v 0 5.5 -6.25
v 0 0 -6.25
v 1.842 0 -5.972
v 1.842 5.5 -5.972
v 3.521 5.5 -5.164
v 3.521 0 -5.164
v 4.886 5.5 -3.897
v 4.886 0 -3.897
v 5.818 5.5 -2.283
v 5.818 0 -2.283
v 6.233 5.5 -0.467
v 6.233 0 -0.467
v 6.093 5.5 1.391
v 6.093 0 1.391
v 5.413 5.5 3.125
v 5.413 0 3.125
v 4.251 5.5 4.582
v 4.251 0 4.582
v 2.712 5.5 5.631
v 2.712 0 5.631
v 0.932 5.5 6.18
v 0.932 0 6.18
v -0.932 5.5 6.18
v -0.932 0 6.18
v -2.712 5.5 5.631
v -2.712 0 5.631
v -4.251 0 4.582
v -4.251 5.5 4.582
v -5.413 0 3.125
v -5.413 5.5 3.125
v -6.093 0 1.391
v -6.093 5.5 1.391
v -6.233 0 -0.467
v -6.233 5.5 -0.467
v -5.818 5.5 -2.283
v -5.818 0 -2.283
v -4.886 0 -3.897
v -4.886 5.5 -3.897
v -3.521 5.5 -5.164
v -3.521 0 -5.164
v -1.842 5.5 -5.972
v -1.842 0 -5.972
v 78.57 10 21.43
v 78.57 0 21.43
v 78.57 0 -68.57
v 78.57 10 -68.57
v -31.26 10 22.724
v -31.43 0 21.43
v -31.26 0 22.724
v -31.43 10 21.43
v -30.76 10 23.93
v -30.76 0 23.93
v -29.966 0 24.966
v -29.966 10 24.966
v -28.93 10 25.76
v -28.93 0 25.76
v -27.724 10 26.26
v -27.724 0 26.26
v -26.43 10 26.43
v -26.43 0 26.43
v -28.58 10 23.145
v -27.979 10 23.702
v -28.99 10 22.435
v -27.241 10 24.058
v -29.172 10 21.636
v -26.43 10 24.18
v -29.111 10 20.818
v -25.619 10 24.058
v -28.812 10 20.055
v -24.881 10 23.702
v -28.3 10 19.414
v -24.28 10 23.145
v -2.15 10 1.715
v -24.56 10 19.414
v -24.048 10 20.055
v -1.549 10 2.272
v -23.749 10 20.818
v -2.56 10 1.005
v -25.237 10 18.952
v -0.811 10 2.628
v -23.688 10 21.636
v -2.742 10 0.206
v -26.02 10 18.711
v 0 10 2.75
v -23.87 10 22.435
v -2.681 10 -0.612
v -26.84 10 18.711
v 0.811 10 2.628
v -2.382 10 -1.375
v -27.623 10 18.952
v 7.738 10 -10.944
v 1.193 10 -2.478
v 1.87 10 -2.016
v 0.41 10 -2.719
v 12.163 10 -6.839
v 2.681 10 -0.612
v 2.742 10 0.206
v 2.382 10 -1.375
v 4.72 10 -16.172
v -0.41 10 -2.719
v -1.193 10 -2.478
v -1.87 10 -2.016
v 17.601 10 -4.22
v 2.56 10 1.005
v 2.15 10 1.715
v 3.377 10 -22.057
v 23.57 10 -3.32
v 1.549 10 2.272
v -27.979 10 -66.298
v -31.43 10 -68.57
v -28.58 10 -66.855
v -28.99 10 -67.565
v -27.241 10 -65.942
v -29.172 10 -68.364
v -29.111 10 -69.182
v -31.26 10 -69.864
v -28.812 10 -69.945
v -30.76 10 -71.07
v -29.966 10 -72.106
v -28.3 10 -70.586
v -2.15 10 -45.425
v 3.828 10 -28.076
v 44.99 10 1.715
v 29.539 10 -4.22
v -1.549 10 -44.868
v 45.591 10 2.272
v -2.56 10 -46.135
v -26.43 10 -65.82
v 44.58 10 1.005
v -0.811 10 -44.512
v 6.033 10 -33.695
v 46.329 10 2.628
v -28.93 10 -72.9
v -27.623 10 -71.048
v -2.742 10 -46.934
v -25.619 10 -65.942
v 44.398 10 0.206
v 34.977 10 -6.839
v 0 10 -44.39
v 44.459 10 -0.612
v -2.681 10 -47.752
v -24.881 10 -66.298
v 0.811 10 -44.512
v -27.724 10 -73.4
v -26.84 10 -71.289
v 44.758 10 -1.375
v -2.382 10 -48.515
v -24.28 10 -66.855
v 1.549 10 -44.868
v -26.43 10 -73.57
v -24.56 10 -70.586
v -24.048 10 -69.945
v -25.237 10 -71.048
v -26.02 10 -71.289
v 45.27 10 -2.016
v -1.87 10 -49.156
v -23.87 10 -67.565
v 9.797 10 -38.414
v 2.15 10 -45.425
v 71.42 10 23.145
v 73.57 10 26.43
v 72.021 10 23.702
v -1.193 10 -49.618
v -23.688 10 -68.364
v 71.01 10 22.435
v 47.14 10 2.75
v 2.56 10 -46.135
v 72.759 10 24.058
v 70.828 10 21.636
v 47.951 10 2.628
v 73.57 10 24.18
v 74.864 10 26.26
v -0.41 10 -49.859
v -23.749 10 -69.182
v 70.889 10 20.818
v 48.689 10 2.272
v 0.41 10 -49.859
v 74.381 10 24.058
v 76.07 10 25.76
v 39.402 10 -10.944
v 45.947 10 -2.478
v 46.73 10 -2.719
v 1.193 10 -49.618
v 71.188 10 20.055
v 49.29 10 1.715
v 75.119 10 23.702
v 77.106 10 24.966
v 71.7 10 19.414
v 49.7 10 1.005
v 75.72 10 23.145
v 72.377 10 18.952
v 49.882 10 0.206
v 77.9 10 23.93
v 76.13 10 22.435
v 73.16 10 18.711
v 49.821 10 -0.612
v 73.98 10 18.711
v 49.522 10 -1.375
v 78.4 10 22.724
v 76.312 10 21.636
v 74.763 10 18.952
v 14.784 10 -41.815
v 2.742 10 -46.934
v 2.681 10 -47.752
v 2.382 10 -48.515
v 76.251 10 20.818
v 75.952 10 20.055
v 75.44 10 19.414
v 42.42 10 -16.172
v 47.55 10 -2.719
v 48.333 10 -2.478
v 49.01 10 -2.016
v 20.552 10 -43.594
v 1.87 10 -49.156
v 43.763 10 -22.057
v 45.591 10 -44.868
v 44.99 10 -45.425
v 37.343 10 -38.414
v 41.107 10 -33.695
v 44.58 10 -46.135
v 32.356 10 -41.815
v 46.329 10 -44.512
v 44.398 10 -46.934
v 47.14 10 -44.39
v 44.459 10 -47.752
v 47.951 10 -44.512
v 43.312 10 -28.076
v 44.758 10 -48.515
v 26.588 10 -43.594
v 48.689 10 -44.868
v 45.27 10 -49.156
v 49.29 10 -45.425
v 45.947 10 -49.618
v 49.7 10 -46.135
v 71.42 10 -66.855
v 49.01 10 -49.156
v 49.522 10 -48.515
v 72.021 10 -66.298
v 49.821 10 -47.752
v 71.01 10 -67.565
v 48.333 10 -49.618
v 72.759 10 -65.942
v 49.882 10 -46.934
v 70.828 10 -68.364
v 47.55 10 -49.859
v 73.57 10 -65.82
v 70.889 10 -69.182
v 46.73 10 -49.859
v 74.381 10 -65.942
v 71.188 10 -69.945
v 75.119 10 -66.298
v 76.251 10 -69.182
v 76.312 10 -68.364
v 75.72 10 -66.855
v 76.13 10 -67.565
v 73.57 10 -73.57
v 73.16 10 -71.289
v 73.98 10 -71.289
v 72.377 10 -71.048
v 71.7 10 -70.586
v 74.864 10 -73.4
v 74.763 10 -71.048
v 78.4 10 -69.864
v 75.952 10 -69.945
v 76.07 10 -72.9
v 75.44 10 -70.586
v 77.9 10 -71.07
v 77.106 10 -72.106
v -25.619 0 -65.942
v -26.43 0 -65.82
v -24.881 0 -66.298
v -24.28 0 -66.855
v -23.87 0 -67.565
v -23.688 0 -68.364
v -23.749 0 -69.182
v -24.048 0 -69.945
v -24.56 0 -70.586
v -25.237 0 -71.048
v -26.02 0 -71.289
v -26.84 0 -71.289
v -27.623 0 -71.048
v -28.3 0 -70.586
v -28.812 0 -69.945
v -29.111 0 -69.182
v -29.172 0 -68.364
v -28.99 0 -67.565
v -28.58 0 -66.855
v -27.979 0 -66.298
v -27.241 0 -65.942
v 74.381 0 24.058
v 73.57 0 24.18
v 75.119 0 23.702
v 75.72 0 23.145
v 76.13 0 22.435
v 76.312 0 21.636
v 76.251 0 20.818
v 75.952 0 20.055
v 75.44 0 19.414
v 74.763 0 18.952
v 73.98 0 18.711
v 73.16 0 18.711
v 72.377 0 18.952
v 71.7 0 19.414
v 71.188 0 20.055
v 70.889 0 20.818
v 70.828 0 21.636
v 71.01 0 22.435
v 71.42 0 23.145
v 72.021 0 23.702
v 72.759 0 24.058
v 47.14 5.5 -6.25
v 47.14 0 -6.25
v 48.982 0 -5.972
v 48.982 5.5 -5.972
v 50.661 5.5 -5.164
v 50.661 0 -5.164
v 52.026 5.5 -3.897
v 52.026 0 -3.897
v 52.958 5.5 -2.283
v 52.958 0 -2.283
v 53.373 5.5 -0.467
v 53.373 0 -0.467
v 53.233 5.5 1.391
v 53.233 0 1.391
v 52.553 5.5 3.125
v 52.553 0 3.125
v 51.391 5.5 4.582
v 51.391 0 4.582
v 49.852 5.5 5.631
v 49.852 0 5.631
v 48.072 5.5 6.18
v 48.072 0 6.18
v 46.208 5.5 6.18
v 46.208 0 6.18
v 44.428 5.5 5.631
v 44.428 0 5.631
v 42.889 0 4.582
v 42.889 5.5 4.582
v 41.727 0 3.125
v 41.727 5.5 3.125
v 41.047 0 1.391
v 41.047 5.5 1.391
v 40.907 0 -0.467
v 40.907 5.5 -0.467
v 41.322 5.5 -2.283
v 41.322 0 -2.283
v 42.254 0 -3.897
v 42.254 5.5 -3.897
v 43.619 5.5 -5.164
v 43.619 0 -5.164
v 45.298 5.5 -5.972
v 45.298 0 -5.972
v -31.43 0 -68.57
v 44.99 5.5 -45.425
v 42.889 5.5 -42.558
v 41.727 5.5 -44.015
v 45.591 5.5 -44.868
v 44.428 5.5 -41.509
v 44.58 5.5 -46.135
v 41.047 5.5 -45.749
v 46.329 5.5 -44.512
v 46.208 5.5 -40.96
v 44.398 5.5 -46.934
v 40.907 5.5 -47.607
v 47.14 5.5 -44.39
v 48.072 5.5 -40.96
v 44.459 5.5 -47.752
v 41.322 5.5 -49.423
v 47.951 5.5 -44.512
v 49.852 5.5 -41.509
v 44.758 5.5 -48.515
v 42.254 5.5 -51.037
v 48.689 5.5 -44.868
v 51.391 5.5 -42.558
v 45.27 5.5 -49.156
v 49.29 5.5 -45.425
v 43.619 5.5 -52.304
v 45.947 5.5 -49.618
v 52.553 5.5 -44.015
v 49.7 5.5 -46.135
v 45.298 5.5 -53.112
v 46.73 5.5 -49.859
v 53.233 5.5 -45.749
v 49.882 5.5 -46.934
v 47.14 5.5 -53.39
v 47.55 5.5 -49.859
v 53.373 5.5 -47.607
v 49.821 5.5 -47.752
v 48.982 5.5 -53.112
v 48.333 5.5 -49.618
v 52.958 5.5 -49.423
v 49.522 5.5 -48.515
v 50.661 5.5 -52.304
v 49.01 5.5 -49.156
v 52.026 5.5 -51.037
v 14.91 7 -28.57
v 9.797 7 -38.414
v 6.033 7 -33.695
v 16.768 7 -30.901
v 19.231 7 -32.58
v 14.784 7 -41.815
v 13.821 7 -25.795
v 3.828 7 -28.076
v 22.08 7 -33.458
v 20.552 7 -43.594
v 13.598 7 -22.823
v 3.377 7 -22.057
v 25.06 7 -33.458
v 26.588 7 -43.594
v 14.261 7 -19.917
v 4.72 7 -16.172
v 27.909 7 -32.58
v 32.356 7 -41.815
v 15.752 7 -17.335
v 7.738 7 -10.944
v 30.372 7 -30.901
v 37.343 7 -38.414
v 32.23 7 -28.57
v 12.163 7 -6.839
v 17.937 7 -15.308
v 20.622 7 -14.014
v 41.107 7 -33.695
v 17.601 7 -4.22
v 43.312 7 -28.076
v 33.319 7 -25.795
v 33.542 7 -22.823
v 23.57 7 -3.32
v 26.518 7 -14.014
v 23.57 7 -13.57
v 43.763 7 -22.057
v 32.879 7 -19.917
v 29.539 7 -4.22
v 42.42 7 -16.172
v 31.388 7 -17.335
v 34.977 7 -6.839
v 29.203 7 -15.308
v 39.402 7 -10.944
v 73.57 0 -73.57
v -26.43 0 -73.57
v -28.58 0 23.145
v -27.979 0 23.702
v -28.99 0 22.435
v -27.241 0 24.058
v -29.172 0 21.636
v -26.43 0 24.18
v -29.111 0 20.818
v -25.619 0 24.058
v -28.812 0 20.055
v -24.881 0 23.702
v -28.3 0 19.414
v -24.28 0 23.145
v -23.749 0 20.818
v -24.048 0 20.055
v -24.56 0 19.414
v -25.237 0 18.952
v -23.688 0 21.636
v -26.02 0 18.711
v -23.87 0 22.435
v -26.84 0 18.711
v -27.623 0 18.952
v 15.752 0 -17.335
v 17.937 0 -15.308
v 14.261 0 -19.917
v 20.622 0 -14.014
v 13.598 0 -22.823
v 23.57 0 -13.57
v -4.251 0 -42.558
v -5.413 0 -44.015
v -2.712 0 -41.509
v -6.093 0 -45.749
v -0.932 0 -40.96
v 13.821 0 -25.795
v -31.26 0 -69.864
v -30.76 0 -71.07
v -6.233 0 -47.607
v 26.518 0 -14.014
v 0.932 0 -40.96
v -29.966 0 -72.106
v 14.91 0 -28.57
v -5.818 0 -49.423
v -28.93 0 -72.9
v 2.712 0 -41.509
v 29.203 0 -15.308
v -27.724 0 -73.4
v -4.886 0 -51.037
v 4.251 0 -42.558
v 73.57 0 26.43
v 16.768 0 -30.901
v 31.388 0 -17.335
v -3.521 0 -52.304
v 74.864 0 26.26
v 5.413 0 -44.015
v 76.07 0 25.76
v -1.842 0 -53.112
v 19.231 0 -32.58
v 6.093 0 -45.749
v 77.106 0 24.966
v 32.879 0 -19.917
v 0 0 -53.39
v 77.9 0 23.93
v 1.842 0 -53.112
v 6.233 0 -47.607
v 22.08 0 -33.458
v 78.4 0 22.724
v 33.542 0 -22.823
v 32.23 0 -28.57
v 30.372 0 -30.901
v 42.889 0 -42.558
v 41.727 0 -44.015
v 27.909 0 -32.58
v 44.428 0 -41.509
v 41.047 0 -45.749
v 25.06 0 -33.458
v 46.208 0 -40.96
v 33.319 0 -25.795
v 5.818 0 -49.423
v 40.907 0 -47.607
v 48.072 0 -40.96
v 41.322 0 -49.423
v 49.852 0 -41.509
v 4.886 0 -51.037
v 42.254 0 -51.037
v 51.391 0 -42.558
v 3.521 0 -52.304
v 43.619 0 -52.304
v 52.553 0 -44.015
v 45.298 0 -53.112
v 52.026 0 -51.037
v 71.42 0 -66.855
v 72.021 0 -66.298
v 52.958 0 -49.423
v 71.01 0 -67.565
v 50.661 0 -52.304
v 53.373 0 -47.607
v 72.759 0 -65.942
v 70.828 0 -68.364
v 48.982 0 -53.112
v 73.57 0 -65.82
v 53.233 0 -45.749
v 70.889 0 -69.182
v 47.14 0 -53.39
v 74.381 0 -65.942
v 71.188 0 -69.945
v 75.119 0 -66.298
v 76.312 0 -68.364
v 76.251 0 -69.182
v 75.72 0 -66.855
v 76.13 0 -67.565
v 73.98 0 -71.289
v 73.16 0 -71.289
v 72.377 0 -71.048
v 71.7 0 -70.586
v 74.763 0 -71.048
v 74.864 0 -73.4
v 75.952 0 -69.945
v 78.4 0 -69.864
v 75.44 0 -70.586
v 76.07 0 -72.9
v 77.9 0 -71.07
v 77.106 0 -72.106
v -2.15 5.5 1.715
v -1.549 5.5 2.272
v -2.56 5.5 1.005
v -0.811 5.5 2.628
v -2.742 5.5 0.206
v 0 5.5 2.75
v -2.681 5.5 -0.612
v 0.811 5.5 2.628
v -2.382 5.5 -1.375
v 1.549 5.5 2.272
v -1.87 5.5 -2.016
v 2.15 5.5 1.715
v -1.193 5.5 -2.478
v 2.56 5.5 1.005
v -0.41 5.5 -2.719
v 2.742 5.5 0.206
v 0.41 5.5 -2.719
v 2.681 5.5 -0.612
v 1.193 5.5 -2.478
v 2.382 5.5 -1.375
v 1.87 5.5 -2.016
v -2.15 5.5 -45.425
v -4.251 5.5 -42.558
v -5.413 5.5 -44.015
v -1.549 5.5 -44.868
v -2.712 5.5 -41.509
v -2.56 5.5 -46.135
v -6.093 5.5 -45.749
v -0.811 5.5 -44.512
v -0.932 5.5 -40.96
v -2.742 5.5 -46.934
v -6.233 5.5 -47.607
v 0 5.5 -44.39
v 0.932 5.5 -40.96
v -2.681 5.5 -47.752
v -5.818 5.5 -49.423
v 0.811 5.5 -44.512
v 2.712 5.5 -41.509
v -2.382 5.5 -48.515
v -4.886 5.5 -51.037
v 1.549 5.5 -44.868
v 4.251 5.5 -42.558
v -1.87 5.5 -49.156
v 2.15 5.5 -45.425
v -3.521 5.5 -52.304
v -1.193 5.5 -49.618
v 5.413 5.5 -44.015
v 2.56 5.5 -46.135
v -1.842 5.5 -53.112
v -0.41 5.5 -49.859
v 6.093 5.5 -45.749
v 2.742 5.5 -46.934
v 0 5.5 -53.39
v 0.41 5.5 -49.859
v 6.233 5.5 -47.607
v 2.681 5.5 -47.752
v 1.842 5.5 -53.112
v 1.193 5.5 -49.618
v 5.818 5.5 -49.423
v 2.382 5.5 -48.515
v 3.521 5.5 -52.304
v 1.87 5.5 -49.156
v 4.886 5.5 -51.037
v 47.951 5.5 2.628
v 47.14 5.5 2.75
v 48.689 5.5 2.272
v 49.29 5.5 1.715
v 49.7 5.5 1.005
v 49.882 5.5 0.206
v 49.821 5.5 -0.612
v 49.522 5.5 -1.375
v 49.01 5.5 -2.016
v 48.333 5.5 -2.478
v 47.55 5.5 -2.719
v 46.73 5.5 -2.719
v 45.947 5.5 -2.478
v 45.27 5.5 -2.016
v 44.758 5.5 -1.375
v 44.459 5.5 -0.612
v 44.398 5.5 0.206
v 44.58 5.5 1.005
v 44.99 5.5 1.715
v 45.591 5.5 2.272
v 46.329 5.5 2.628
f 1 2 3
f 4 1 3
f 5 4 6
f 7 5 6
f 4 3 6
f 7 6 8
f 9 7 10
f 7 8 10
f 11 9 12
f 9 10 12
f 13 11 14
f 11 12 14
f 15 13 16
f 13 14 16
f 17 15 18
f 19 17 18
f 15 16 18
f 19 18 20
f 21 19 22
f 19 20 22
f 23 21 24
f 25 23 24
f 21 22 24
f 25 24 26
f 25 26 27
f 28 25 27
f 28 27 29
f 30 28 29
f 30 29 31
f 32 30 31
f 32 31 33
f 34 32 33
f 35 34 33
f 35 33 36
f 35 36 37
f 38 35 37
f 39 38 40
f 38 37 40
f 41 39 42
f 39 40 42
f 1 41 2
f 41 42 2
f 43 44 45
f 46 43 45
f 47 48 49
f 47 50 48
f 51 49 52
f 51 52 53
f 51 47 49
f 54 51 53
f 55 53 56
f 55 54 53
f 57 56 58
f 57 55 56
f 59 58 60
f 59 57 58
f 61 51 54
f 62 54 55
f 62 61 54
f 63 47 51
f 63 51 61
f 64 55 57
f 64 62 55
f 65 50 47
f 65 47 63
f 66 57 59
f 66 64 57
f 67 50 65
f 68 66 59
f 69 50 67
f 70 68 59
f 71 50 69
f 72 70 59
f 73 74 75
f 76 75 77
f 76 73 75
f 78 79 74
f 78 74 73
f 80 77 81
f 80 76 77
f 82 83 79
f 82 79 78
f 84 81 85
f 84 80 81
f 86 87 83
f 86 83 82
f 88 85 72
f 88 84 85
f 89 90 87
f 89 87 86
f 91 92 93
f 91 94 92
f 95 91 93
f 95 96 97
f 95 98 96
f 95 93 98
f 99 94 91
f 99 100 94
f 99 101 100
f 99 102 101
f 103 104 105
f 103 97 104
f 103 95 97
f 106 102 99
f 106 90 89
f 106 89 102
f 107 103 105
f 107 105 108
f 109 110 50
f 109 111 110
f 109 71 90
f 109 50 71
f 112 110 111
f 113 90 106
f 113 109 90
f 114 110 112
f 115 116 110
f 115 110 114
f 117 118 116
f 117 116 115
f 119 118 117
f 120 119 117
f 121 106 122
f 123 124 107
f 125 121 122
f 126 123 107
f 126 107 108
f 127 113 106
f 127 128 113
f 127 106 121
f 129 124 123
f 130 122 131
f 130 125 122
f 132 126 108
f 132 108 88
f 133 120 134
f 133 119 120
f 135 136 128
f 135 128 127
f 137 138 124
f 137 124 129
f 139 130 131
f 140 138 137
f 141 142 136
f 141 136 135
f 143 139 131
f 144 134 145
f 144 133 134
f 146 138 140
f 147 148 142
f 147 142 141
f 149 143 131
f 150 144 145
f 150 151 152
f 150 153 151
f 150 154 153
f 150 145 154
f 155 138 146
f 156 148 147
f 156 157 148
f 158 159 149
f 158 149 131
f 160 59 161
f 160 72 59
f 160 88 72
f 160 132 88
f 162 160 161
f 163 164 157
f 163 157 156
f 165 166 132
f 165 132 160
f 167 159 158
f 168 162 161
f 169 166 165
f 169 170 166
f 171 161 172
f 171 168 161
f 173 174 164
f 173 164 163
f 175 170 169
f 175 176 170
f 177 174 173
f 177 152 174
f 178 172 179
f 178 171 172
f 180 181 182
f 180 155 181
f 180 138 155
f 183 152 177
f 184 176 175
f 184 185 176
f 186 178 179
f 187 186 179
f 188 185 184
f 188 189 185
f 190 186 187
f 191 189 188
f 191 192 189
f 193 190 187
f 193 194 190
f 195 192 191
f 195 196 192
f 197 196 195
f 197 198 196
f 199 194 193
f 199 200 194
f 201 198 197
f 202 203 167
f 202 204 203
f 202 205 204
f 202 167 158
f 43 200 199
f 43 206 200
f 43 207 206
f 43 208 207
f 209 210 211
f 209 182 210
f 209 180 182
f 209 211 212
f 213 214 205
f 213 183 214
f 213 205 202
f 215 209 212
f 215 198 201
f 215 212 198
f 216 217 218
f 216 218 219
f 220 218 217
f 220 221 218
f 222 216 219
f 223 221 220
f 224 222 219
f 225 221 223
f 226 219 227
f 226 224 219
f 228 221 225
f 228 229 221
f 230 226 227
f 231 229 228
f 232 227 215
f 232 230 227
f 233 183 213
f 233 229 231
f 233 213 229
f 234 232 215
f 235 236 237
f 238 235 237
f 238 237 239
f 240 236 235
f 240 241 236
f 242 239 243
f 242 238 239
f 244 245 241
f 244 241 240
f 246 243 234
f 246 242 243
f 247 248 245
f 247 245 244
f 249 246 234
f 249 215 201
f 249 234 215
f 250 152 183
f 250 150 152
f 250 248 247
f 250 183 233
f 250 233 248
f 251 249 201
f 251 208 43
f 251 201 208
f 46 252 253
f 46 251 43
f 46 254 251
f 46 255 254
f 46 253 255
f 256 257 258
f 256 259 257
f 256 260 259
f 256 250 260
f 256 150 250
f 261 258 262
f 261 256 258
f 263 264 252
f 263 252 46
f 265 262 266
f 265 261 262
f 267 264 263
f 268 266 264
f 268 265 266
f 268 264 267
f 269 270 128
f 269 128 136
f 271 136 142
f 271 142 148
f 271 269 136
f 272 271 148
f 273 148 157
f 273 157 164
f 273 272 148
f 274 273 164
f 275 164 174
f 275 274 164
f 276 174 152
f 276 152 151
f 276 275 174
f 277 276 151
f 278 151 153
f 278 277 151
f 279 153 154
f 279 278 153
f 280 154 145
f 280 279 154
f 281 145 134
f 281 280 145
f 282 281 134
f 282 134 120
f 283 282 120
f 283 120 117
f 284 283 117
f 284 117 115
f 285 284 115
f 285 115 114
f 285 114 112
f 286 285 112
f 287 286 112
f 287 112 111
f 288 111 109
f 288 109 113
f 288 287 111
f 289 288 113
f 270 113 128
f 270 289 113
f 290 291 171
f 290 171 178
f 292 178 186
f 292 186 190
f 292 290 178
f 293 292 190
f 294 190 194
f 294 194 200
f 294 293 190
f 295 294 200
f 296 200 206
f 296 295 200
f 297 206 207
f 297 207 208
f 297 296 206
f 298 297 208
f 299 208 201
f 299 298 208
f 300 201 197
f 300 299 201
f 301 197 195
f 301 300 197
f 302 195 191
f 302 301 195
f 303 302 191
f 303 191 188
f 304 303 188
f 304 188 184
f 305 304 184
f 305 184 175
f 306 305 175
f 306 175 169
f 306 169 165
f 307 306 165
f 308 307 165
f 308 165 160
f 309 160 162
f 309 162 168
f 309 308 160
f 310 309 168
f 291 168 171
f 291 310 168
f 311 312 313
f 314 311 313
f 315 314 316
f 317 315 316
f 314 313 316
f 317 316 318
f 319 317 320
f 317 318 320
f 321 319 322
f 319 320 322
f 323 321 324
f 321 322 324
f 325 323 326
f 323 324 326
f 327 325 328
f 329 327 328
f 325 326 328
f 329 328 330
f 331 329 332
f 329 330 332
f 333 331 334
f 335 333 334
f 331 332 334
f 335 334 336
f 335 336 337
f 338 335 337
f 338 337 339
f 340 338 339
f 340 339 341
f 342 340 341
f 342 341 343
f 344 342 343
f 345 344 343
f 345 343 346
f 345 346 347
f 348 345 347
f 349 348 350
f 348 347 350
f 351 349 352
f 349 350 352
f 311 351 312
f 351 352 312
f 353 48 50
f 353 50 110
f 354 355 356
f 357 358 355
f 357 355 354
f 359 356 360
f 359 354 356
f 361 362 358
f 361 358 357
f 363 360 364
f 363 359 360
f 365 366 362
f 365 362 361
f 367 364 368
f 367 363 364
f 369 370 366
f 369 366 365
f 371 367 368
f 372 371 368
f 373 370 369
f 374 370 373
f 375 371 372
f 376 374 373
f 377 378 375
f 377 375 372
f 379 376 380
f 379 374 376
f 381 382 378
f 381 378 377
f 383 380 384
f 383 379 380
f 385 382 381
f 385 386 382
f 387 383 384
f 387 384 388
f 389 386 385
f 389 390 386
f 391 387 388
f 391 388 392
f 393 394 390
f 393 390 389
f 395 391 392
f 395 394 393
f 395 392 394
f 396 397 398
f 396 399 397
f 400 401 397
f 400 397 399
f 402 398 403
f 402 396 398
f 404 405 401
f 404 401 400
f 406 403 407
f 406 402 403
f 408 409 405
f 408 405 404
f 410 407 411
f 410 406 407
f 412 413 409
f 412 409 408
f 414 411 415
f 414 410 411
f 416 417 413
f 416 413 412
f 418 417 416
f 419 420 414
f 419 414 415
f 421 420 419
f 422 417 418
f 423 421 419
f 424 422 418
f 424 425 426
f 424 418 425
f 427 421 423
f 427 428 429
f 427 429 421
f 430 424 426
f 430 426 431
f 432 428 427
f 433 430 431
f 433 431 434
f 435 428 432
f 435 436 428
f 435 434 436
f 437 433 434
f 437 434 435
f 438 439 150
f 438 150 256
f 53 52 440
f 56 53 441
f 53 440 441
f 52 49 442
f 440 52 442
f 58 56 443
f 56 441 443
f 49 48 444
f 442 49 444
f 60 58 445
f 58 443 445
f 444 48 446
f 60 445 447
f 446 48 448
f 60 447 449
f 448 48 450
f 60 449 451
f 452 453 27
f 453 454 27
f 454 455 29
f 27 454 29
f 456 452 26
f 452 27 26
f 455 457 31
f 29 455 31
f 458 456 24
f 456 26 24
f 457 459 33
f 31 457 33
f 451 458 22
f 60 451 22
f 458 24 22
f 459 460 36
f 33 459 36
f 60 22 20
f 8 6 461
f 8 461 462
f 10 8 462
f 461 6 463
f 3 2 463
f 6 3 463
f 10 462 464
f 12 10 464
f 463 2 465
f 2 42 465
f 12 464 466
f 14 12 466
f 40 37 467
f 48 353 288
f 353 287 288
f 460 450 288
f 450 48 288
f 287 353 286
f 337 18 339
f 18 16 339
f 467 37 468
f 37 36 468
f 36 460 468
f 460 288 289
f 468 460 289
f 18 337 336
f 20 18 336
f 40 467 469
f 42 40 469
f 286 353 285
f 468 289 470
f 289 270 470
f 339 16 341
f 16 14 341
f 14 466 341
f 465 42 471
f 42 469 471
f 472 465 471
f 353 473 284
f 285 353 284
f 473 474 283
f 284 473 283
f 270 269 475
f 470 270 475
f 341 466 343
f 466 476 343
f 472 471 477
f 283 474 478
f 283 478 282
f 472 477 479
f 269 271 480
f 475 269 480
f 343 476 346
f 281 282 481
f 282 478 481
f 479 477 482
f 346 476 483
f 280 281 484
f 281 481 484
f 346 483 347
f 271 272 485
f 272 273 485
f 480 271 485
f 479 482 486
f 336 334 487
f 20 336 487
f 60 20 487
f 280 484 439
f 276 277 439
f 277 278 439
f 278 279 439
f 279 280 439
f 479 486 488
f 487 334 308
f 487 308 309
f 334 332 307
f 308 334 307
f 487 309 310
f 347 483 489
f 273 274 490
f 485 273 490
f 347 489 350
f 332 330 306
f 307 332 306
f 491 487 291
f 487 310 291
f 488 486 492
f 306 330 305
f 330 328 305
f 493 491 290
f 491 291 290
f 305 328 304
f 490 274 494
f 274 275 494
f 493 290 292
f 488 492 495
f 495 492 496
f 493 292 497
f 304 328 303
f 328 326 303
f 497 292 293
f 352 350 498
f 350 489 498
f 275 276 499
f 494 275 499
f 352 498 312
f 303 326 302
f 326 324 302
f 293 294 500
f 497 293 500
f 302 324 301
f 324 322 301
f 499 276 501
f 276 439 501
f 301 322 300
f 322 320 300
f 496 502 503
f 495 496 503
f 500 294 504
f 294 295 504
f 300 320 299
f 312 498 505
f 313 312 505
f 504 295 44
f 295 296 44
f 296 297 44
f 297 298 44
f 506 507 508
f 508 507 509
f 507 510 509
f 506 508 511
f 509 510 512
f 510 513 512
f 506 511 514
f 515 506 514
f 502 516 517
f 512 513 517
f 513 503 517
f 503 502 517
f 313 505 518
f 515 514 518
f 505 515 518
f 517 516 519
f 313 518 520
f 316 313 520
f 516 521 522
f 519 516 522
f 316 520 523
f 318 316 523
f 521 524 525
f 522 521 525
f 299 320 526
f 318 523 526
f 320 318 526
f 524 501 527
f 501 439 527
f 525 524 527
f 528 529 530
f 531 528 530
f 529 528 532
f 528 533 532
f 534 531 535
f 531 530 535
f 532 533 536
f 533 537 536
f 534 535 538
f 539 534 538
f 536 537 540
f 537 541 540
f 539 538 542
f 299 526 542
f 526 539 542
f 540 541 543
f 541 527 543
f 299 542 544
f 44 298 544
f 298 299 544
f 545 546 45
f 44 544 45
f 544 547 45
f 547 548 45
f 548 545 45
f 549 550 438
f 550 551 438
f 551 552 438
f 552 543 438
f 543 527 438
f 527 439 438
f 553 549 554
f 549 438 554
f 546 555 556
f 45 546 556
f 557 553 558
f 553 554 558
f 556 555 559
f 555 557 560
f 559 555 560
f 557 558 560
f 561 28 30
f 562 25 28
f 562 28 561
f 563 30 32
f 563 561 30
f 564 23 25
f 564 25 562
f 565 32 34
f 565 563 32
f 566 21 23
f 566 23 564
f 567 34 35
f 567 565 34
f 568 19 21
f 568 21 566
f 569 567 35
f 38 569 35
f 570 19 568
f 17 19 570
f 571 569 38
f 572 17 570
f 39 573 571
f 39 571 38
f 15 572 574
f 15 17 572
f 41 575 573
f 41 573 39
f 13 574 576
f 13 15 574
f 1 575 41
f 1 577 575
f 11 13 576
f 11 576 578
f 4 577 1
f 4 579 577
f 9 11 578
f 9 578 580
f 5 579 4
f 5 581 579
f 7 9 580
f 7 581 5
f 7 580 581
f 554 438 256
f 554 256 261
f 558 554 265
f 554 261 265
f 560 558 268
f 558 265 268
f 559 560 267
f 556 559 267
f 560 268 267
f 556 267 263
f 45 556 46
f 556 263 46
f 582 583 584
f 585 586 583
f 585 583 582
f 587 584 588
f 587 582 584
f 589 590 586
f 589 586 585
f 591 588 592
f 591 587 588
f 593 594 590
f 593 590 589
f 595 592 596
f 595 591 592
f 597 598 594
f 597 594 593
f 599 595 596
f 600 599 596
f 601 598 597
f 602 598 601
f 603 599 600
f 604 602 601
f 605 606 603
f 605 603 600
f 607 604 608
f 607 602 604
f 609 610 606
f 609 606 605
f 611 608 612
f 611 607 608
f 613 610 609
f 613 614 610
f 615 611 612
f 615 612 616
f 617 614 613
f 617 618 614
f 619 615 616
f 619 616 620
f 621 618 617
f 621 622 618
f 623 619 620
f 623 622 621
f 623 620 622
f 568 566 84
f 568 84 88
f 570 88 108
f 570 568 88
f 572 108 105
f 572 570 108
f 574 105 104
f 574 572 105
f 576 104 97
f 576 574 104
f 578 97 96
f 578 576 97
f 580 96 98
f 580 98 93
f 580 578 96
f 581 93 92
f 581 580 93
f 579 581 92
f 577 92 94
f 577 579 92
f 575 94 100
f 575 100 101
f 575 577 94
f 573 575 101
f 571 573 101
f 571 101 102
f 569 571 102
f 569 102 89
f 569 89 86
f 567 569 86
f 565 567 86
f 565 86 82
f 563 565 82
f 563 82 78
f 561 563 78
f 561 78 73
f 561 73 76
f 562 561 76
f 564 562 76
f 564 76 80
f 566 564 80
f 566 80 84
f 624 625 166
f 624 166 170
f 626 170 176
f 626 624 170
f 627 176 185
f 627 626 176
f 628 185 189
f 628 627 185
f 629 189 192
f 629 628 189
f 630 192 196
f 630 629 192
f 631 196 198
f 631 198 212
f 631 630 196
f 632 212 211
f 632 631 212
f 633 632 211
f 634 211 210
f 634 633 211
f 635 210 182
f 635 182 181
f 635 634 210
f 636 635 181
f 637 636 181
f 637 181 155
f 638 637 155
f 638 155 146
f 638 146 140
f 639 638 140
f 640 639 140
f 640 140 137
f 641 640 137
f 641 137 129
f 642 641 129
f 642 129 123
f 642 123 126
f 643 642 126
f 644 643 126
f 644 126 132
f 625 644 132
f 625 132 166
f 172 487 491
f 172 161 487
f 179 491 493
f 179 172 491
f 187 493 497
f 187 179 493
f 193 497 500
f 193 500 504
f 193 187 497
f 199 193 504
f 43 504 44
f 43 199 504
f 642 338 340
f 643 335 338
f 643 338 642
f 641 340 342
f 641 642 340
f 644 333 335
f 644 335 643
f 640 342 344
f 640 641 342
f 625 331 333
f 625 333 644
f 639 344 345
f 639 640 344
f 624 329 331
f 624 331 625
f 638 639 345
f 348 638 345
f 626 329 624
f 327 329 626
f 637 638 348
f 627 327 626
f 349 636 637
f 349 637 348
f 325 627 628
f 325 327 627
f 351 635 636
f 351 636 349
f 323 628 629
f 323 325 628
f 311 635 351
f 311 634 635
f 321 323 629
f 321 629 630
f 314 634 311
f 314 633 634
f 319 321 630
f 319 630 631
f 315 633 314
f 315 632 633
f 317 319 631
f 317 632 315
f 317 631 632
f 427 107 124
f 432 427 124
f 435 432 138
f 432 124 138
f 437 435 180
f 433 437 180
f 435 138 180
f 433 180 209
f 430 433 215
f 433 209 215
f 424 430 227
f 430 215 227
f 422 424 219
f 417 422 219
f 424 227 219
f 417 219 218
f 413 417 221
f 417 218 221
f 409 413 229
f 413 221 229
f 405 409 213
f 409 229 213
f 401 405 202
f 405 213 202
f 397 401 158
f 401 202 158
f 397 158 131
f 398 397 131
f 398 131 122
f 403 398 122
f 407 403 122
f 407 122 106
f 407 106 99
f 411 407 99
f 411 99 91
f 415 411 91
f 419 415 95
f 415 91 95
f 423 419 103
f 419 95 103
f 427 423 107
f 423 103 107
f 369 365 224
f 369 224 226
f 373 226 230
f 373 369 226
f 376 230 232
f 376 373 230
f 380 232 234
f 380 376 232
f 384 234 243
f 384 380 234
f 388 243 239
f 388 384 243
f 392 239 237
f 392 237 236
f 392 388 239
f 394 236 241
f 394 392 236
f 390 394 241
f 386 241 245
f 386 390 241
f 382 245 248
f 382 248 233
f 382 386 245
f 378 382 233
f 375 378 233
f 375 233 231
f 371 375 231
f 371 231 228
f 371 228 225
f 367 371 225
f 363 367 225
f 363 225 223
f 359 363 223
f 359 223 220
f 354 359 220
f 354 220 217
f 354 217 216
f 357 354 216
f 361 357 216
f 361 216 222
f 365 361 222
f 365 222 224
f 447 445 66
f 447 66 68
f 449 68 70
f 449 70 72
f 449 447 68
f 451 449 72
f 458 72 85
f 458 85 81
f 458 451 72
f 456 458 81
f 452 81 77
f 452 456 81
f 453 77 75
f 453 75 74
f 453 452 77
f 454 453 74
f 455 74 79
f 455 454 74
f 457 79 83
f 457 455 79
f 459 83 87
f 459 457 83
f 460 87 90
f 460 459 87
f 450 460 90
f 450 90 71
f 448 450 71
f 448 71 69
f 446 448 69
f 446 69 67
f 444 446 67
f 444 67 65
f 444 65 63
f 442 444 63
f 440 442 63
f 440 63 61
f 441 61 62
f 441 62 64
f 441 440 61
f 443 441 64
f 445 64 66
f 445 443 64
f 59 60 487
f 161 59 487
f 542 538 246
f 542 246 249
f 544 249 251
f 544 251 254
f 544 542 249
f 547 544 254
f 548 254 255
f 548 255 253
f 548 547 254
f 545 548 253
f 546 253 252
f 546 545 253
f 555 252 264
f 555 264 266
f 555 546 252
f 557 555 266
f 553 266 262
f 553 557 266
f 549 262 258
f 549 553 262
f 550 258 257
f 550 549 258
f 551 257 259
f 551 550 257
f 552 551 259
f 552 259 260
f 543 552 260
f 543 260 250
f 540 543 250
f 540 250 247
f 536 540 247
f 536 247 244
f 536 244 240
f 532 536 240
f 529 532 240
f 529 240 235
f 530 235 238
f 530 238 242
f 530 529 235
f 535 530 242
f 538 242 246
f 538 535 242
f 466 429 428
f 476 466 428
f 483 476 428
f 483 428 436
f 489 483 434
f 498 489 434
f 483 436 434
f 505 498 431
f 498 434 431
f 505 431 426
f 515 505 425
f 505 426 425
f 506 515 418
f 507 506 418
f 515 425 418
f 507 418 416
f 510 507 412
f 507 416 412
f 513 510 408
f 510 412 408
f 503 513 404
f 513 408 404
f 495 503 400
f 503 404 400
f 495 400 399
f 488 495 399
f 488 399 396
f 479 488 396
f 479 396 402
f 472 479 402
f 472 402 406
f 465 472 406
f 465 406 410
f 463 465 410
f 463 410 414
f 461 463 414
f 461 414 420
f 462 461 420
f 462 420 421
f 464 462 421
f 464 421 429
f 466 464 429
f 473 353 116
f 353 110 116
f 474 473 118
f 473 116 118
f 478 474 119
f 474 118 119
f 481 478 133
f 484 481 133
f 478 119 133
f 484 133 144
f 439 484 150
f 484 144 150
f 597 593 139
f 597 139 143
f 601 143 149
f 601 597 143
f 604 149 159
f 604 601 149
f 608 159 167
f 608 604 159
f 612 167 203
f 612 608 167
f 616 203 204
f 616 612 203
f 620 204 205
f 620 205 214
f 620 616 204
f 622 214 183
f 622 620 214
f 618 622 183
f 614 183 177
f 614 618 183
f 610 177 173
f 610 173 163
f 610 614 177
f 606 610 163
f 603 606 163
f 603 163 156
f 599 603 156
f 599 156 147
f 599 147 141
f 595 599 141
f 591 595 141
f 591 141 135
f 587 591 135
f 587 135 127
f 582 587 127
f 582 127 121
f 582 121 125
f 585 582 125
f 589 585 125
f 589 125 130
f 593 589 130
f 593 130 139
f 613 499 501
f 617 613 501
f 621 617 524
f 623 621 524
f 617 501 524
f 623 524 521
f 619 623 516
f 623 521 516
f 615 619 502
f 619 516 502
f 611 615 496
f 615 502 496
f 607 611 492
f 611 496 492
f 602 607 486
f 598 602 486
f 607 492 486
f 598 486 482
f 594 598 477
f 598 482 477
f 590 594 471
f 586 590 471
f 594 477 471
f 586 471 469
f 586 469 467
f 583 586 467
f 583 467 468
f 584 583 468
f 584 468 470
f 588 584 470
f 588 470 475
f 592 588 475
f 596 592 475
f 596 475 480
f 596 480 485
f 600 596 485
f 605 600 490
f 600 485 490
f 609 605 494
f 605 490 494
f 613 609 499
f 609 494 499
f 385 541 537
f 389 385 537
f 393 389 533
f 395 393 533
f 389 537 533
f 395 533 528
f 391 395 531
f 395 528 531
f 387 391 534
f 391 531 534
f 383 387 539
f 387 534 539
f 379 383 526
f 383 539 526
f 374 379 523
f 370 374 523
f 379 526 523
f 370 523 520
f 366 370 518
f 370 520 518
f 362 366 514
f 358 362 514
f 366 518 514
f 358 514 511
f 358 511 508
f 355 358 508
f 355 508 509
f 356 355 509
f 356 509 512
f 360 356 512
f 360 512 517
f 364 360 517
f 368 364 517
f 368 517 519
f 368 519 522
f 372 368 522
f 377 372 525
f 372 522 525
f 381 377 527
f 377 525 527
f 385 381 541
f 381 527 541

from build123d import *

# Parameters (mm, degrees)
SKETCH2_W           = 110
SKETCH2_H           = 100
SKETCH2_R           = 2.75
BOSS_EXTRUDE1_DEPTH = 10
SKETCH3_R           = 10
CUT_EXTRUDE1_DEPTH  = 10
SKETCH4_R           = 20.25
CUT_EXTRUDE2_DEPTH  = 3
SKETCH5_R           = 6.25
CUT_EXTRUDE3_DEPTH  = 5.5
FILLET1_R           = 5


with BuildPart() as part:
    # Sketch2 → Boss-Extrude1 (new body)
    with BuildSketch(Plane(origin=(0, 0, 0), x_dir=(1, 0, 0), z_dir=(0, 1, 0))):
        with Locations((23.57, 23.57)):
            Rectangle(SKETCH2_W, SKETCH2_H)
        with Locations(Location((0, 47.14, 0), (0, 0, 270))):
            Circle(SKETCH2_R, mode=Mode.SUBTRACT)
        with Locations(Location((47.14, 47.14, 0), (0, 0, 270))):
            Circle(SKETCH2_R, mode=Mode.SUBTRACT)
        with Locations(Location((47.14, 0, 0), (0, 0, 270))):
            Circle(SKETCH2_R, mode=Mode.SUBTRACT)
        with Locations(Location((0, 0, 0), (0, 0, 270))):
            Circle(SKETCH2_R, mode=Mode.SUBTRACT)
        with Locations(Location((-26.43, 68.57, 0), (0, 0, 270))):
            Circle(SKETCH2_R, mode=Mode.SUBTRACT)
        with Locations(Location((73.57, 68.57, 0), (0, 0, 270))):
            Circle(SKETCH2_R, mode=Mode.SUBTRACT)
        with Locations(Location((73.57, -21.43, 0), (0, 0, 270))):
            Circle(SKETCH2_R, mode=Mode.SUBTRACT)
        with Locations(Location((-26.43, -21.43, 0), (0, 0, 270))):
            Circle(SKETCH2_R, mode=Mode.SUBTRACT)
    extrude(amount=BOSS_EXTRUDE1_DEPTH)

    # Sketch3 → Cut-Extrude1 (cut)
    with BuildSketch(Plane(origin=(0, 10, 0), x_dir=(1, 0, 0), z_dir=(0, 1, 0))):
        with Locations(Location((23.57, 23.57, 0), (0, 0, 270))):
            Circle(SKETCH3_R)
    extrude(amount=-CUT_EXTRUDE1_DEPTH, mode=Mode.SUBTRACT)

    # Sketch4 → Cut-Extrude2 (cut)
    with BuildSketch(Plane(origin=(0, 10, 0), x_dir=(1, 0, 0), z_dir=(0, 1, 0))):
        with Locations(Location((23.57, 23.57, 0), (0, 0, 270))):
            Circle(SKETCH4_R)
    extrude(amount=-CUT_EXTRUDE2_DEPTH, mode=Mode.SUBTRACT)

    # Sketch5 → Cut-Extrude3 (cut)
    with BuildSketch(Plane.XZ):
        with Locations(Location((0, 0, 0), (0, 0, 270))):
            Circle(SKETCH5_R)
        with Locations(Location((47.14, 0, 0), (0, 0, 270))):
            Circle(SKETCH5_R)
        with Locations(Location((47.14, -47.14, 0), (0, 0, 270))):
            Circle(SKETCH5_R)
        with Locations(Location((0, -47.14, 0), (0, 0, 270))):
            Circle(SKETCH5_R)
    extrude(amount=-CUT_EXTRUDE3_DEPTH, mode=Mode.SUBTRACT)

    # Fillet1
    fillet1_edges = [part.edges().sort_by_distance(p)[0] for p in [
        (78.57, 5, 26.43),
        (-31.43, 5, 26.43),
        (-31.43, 5, -73.57),
        (78.57, 5, -73.57),
    ]]
    fillet(fillet1_edges, radius=FILLET1_R)


solid = part.part
